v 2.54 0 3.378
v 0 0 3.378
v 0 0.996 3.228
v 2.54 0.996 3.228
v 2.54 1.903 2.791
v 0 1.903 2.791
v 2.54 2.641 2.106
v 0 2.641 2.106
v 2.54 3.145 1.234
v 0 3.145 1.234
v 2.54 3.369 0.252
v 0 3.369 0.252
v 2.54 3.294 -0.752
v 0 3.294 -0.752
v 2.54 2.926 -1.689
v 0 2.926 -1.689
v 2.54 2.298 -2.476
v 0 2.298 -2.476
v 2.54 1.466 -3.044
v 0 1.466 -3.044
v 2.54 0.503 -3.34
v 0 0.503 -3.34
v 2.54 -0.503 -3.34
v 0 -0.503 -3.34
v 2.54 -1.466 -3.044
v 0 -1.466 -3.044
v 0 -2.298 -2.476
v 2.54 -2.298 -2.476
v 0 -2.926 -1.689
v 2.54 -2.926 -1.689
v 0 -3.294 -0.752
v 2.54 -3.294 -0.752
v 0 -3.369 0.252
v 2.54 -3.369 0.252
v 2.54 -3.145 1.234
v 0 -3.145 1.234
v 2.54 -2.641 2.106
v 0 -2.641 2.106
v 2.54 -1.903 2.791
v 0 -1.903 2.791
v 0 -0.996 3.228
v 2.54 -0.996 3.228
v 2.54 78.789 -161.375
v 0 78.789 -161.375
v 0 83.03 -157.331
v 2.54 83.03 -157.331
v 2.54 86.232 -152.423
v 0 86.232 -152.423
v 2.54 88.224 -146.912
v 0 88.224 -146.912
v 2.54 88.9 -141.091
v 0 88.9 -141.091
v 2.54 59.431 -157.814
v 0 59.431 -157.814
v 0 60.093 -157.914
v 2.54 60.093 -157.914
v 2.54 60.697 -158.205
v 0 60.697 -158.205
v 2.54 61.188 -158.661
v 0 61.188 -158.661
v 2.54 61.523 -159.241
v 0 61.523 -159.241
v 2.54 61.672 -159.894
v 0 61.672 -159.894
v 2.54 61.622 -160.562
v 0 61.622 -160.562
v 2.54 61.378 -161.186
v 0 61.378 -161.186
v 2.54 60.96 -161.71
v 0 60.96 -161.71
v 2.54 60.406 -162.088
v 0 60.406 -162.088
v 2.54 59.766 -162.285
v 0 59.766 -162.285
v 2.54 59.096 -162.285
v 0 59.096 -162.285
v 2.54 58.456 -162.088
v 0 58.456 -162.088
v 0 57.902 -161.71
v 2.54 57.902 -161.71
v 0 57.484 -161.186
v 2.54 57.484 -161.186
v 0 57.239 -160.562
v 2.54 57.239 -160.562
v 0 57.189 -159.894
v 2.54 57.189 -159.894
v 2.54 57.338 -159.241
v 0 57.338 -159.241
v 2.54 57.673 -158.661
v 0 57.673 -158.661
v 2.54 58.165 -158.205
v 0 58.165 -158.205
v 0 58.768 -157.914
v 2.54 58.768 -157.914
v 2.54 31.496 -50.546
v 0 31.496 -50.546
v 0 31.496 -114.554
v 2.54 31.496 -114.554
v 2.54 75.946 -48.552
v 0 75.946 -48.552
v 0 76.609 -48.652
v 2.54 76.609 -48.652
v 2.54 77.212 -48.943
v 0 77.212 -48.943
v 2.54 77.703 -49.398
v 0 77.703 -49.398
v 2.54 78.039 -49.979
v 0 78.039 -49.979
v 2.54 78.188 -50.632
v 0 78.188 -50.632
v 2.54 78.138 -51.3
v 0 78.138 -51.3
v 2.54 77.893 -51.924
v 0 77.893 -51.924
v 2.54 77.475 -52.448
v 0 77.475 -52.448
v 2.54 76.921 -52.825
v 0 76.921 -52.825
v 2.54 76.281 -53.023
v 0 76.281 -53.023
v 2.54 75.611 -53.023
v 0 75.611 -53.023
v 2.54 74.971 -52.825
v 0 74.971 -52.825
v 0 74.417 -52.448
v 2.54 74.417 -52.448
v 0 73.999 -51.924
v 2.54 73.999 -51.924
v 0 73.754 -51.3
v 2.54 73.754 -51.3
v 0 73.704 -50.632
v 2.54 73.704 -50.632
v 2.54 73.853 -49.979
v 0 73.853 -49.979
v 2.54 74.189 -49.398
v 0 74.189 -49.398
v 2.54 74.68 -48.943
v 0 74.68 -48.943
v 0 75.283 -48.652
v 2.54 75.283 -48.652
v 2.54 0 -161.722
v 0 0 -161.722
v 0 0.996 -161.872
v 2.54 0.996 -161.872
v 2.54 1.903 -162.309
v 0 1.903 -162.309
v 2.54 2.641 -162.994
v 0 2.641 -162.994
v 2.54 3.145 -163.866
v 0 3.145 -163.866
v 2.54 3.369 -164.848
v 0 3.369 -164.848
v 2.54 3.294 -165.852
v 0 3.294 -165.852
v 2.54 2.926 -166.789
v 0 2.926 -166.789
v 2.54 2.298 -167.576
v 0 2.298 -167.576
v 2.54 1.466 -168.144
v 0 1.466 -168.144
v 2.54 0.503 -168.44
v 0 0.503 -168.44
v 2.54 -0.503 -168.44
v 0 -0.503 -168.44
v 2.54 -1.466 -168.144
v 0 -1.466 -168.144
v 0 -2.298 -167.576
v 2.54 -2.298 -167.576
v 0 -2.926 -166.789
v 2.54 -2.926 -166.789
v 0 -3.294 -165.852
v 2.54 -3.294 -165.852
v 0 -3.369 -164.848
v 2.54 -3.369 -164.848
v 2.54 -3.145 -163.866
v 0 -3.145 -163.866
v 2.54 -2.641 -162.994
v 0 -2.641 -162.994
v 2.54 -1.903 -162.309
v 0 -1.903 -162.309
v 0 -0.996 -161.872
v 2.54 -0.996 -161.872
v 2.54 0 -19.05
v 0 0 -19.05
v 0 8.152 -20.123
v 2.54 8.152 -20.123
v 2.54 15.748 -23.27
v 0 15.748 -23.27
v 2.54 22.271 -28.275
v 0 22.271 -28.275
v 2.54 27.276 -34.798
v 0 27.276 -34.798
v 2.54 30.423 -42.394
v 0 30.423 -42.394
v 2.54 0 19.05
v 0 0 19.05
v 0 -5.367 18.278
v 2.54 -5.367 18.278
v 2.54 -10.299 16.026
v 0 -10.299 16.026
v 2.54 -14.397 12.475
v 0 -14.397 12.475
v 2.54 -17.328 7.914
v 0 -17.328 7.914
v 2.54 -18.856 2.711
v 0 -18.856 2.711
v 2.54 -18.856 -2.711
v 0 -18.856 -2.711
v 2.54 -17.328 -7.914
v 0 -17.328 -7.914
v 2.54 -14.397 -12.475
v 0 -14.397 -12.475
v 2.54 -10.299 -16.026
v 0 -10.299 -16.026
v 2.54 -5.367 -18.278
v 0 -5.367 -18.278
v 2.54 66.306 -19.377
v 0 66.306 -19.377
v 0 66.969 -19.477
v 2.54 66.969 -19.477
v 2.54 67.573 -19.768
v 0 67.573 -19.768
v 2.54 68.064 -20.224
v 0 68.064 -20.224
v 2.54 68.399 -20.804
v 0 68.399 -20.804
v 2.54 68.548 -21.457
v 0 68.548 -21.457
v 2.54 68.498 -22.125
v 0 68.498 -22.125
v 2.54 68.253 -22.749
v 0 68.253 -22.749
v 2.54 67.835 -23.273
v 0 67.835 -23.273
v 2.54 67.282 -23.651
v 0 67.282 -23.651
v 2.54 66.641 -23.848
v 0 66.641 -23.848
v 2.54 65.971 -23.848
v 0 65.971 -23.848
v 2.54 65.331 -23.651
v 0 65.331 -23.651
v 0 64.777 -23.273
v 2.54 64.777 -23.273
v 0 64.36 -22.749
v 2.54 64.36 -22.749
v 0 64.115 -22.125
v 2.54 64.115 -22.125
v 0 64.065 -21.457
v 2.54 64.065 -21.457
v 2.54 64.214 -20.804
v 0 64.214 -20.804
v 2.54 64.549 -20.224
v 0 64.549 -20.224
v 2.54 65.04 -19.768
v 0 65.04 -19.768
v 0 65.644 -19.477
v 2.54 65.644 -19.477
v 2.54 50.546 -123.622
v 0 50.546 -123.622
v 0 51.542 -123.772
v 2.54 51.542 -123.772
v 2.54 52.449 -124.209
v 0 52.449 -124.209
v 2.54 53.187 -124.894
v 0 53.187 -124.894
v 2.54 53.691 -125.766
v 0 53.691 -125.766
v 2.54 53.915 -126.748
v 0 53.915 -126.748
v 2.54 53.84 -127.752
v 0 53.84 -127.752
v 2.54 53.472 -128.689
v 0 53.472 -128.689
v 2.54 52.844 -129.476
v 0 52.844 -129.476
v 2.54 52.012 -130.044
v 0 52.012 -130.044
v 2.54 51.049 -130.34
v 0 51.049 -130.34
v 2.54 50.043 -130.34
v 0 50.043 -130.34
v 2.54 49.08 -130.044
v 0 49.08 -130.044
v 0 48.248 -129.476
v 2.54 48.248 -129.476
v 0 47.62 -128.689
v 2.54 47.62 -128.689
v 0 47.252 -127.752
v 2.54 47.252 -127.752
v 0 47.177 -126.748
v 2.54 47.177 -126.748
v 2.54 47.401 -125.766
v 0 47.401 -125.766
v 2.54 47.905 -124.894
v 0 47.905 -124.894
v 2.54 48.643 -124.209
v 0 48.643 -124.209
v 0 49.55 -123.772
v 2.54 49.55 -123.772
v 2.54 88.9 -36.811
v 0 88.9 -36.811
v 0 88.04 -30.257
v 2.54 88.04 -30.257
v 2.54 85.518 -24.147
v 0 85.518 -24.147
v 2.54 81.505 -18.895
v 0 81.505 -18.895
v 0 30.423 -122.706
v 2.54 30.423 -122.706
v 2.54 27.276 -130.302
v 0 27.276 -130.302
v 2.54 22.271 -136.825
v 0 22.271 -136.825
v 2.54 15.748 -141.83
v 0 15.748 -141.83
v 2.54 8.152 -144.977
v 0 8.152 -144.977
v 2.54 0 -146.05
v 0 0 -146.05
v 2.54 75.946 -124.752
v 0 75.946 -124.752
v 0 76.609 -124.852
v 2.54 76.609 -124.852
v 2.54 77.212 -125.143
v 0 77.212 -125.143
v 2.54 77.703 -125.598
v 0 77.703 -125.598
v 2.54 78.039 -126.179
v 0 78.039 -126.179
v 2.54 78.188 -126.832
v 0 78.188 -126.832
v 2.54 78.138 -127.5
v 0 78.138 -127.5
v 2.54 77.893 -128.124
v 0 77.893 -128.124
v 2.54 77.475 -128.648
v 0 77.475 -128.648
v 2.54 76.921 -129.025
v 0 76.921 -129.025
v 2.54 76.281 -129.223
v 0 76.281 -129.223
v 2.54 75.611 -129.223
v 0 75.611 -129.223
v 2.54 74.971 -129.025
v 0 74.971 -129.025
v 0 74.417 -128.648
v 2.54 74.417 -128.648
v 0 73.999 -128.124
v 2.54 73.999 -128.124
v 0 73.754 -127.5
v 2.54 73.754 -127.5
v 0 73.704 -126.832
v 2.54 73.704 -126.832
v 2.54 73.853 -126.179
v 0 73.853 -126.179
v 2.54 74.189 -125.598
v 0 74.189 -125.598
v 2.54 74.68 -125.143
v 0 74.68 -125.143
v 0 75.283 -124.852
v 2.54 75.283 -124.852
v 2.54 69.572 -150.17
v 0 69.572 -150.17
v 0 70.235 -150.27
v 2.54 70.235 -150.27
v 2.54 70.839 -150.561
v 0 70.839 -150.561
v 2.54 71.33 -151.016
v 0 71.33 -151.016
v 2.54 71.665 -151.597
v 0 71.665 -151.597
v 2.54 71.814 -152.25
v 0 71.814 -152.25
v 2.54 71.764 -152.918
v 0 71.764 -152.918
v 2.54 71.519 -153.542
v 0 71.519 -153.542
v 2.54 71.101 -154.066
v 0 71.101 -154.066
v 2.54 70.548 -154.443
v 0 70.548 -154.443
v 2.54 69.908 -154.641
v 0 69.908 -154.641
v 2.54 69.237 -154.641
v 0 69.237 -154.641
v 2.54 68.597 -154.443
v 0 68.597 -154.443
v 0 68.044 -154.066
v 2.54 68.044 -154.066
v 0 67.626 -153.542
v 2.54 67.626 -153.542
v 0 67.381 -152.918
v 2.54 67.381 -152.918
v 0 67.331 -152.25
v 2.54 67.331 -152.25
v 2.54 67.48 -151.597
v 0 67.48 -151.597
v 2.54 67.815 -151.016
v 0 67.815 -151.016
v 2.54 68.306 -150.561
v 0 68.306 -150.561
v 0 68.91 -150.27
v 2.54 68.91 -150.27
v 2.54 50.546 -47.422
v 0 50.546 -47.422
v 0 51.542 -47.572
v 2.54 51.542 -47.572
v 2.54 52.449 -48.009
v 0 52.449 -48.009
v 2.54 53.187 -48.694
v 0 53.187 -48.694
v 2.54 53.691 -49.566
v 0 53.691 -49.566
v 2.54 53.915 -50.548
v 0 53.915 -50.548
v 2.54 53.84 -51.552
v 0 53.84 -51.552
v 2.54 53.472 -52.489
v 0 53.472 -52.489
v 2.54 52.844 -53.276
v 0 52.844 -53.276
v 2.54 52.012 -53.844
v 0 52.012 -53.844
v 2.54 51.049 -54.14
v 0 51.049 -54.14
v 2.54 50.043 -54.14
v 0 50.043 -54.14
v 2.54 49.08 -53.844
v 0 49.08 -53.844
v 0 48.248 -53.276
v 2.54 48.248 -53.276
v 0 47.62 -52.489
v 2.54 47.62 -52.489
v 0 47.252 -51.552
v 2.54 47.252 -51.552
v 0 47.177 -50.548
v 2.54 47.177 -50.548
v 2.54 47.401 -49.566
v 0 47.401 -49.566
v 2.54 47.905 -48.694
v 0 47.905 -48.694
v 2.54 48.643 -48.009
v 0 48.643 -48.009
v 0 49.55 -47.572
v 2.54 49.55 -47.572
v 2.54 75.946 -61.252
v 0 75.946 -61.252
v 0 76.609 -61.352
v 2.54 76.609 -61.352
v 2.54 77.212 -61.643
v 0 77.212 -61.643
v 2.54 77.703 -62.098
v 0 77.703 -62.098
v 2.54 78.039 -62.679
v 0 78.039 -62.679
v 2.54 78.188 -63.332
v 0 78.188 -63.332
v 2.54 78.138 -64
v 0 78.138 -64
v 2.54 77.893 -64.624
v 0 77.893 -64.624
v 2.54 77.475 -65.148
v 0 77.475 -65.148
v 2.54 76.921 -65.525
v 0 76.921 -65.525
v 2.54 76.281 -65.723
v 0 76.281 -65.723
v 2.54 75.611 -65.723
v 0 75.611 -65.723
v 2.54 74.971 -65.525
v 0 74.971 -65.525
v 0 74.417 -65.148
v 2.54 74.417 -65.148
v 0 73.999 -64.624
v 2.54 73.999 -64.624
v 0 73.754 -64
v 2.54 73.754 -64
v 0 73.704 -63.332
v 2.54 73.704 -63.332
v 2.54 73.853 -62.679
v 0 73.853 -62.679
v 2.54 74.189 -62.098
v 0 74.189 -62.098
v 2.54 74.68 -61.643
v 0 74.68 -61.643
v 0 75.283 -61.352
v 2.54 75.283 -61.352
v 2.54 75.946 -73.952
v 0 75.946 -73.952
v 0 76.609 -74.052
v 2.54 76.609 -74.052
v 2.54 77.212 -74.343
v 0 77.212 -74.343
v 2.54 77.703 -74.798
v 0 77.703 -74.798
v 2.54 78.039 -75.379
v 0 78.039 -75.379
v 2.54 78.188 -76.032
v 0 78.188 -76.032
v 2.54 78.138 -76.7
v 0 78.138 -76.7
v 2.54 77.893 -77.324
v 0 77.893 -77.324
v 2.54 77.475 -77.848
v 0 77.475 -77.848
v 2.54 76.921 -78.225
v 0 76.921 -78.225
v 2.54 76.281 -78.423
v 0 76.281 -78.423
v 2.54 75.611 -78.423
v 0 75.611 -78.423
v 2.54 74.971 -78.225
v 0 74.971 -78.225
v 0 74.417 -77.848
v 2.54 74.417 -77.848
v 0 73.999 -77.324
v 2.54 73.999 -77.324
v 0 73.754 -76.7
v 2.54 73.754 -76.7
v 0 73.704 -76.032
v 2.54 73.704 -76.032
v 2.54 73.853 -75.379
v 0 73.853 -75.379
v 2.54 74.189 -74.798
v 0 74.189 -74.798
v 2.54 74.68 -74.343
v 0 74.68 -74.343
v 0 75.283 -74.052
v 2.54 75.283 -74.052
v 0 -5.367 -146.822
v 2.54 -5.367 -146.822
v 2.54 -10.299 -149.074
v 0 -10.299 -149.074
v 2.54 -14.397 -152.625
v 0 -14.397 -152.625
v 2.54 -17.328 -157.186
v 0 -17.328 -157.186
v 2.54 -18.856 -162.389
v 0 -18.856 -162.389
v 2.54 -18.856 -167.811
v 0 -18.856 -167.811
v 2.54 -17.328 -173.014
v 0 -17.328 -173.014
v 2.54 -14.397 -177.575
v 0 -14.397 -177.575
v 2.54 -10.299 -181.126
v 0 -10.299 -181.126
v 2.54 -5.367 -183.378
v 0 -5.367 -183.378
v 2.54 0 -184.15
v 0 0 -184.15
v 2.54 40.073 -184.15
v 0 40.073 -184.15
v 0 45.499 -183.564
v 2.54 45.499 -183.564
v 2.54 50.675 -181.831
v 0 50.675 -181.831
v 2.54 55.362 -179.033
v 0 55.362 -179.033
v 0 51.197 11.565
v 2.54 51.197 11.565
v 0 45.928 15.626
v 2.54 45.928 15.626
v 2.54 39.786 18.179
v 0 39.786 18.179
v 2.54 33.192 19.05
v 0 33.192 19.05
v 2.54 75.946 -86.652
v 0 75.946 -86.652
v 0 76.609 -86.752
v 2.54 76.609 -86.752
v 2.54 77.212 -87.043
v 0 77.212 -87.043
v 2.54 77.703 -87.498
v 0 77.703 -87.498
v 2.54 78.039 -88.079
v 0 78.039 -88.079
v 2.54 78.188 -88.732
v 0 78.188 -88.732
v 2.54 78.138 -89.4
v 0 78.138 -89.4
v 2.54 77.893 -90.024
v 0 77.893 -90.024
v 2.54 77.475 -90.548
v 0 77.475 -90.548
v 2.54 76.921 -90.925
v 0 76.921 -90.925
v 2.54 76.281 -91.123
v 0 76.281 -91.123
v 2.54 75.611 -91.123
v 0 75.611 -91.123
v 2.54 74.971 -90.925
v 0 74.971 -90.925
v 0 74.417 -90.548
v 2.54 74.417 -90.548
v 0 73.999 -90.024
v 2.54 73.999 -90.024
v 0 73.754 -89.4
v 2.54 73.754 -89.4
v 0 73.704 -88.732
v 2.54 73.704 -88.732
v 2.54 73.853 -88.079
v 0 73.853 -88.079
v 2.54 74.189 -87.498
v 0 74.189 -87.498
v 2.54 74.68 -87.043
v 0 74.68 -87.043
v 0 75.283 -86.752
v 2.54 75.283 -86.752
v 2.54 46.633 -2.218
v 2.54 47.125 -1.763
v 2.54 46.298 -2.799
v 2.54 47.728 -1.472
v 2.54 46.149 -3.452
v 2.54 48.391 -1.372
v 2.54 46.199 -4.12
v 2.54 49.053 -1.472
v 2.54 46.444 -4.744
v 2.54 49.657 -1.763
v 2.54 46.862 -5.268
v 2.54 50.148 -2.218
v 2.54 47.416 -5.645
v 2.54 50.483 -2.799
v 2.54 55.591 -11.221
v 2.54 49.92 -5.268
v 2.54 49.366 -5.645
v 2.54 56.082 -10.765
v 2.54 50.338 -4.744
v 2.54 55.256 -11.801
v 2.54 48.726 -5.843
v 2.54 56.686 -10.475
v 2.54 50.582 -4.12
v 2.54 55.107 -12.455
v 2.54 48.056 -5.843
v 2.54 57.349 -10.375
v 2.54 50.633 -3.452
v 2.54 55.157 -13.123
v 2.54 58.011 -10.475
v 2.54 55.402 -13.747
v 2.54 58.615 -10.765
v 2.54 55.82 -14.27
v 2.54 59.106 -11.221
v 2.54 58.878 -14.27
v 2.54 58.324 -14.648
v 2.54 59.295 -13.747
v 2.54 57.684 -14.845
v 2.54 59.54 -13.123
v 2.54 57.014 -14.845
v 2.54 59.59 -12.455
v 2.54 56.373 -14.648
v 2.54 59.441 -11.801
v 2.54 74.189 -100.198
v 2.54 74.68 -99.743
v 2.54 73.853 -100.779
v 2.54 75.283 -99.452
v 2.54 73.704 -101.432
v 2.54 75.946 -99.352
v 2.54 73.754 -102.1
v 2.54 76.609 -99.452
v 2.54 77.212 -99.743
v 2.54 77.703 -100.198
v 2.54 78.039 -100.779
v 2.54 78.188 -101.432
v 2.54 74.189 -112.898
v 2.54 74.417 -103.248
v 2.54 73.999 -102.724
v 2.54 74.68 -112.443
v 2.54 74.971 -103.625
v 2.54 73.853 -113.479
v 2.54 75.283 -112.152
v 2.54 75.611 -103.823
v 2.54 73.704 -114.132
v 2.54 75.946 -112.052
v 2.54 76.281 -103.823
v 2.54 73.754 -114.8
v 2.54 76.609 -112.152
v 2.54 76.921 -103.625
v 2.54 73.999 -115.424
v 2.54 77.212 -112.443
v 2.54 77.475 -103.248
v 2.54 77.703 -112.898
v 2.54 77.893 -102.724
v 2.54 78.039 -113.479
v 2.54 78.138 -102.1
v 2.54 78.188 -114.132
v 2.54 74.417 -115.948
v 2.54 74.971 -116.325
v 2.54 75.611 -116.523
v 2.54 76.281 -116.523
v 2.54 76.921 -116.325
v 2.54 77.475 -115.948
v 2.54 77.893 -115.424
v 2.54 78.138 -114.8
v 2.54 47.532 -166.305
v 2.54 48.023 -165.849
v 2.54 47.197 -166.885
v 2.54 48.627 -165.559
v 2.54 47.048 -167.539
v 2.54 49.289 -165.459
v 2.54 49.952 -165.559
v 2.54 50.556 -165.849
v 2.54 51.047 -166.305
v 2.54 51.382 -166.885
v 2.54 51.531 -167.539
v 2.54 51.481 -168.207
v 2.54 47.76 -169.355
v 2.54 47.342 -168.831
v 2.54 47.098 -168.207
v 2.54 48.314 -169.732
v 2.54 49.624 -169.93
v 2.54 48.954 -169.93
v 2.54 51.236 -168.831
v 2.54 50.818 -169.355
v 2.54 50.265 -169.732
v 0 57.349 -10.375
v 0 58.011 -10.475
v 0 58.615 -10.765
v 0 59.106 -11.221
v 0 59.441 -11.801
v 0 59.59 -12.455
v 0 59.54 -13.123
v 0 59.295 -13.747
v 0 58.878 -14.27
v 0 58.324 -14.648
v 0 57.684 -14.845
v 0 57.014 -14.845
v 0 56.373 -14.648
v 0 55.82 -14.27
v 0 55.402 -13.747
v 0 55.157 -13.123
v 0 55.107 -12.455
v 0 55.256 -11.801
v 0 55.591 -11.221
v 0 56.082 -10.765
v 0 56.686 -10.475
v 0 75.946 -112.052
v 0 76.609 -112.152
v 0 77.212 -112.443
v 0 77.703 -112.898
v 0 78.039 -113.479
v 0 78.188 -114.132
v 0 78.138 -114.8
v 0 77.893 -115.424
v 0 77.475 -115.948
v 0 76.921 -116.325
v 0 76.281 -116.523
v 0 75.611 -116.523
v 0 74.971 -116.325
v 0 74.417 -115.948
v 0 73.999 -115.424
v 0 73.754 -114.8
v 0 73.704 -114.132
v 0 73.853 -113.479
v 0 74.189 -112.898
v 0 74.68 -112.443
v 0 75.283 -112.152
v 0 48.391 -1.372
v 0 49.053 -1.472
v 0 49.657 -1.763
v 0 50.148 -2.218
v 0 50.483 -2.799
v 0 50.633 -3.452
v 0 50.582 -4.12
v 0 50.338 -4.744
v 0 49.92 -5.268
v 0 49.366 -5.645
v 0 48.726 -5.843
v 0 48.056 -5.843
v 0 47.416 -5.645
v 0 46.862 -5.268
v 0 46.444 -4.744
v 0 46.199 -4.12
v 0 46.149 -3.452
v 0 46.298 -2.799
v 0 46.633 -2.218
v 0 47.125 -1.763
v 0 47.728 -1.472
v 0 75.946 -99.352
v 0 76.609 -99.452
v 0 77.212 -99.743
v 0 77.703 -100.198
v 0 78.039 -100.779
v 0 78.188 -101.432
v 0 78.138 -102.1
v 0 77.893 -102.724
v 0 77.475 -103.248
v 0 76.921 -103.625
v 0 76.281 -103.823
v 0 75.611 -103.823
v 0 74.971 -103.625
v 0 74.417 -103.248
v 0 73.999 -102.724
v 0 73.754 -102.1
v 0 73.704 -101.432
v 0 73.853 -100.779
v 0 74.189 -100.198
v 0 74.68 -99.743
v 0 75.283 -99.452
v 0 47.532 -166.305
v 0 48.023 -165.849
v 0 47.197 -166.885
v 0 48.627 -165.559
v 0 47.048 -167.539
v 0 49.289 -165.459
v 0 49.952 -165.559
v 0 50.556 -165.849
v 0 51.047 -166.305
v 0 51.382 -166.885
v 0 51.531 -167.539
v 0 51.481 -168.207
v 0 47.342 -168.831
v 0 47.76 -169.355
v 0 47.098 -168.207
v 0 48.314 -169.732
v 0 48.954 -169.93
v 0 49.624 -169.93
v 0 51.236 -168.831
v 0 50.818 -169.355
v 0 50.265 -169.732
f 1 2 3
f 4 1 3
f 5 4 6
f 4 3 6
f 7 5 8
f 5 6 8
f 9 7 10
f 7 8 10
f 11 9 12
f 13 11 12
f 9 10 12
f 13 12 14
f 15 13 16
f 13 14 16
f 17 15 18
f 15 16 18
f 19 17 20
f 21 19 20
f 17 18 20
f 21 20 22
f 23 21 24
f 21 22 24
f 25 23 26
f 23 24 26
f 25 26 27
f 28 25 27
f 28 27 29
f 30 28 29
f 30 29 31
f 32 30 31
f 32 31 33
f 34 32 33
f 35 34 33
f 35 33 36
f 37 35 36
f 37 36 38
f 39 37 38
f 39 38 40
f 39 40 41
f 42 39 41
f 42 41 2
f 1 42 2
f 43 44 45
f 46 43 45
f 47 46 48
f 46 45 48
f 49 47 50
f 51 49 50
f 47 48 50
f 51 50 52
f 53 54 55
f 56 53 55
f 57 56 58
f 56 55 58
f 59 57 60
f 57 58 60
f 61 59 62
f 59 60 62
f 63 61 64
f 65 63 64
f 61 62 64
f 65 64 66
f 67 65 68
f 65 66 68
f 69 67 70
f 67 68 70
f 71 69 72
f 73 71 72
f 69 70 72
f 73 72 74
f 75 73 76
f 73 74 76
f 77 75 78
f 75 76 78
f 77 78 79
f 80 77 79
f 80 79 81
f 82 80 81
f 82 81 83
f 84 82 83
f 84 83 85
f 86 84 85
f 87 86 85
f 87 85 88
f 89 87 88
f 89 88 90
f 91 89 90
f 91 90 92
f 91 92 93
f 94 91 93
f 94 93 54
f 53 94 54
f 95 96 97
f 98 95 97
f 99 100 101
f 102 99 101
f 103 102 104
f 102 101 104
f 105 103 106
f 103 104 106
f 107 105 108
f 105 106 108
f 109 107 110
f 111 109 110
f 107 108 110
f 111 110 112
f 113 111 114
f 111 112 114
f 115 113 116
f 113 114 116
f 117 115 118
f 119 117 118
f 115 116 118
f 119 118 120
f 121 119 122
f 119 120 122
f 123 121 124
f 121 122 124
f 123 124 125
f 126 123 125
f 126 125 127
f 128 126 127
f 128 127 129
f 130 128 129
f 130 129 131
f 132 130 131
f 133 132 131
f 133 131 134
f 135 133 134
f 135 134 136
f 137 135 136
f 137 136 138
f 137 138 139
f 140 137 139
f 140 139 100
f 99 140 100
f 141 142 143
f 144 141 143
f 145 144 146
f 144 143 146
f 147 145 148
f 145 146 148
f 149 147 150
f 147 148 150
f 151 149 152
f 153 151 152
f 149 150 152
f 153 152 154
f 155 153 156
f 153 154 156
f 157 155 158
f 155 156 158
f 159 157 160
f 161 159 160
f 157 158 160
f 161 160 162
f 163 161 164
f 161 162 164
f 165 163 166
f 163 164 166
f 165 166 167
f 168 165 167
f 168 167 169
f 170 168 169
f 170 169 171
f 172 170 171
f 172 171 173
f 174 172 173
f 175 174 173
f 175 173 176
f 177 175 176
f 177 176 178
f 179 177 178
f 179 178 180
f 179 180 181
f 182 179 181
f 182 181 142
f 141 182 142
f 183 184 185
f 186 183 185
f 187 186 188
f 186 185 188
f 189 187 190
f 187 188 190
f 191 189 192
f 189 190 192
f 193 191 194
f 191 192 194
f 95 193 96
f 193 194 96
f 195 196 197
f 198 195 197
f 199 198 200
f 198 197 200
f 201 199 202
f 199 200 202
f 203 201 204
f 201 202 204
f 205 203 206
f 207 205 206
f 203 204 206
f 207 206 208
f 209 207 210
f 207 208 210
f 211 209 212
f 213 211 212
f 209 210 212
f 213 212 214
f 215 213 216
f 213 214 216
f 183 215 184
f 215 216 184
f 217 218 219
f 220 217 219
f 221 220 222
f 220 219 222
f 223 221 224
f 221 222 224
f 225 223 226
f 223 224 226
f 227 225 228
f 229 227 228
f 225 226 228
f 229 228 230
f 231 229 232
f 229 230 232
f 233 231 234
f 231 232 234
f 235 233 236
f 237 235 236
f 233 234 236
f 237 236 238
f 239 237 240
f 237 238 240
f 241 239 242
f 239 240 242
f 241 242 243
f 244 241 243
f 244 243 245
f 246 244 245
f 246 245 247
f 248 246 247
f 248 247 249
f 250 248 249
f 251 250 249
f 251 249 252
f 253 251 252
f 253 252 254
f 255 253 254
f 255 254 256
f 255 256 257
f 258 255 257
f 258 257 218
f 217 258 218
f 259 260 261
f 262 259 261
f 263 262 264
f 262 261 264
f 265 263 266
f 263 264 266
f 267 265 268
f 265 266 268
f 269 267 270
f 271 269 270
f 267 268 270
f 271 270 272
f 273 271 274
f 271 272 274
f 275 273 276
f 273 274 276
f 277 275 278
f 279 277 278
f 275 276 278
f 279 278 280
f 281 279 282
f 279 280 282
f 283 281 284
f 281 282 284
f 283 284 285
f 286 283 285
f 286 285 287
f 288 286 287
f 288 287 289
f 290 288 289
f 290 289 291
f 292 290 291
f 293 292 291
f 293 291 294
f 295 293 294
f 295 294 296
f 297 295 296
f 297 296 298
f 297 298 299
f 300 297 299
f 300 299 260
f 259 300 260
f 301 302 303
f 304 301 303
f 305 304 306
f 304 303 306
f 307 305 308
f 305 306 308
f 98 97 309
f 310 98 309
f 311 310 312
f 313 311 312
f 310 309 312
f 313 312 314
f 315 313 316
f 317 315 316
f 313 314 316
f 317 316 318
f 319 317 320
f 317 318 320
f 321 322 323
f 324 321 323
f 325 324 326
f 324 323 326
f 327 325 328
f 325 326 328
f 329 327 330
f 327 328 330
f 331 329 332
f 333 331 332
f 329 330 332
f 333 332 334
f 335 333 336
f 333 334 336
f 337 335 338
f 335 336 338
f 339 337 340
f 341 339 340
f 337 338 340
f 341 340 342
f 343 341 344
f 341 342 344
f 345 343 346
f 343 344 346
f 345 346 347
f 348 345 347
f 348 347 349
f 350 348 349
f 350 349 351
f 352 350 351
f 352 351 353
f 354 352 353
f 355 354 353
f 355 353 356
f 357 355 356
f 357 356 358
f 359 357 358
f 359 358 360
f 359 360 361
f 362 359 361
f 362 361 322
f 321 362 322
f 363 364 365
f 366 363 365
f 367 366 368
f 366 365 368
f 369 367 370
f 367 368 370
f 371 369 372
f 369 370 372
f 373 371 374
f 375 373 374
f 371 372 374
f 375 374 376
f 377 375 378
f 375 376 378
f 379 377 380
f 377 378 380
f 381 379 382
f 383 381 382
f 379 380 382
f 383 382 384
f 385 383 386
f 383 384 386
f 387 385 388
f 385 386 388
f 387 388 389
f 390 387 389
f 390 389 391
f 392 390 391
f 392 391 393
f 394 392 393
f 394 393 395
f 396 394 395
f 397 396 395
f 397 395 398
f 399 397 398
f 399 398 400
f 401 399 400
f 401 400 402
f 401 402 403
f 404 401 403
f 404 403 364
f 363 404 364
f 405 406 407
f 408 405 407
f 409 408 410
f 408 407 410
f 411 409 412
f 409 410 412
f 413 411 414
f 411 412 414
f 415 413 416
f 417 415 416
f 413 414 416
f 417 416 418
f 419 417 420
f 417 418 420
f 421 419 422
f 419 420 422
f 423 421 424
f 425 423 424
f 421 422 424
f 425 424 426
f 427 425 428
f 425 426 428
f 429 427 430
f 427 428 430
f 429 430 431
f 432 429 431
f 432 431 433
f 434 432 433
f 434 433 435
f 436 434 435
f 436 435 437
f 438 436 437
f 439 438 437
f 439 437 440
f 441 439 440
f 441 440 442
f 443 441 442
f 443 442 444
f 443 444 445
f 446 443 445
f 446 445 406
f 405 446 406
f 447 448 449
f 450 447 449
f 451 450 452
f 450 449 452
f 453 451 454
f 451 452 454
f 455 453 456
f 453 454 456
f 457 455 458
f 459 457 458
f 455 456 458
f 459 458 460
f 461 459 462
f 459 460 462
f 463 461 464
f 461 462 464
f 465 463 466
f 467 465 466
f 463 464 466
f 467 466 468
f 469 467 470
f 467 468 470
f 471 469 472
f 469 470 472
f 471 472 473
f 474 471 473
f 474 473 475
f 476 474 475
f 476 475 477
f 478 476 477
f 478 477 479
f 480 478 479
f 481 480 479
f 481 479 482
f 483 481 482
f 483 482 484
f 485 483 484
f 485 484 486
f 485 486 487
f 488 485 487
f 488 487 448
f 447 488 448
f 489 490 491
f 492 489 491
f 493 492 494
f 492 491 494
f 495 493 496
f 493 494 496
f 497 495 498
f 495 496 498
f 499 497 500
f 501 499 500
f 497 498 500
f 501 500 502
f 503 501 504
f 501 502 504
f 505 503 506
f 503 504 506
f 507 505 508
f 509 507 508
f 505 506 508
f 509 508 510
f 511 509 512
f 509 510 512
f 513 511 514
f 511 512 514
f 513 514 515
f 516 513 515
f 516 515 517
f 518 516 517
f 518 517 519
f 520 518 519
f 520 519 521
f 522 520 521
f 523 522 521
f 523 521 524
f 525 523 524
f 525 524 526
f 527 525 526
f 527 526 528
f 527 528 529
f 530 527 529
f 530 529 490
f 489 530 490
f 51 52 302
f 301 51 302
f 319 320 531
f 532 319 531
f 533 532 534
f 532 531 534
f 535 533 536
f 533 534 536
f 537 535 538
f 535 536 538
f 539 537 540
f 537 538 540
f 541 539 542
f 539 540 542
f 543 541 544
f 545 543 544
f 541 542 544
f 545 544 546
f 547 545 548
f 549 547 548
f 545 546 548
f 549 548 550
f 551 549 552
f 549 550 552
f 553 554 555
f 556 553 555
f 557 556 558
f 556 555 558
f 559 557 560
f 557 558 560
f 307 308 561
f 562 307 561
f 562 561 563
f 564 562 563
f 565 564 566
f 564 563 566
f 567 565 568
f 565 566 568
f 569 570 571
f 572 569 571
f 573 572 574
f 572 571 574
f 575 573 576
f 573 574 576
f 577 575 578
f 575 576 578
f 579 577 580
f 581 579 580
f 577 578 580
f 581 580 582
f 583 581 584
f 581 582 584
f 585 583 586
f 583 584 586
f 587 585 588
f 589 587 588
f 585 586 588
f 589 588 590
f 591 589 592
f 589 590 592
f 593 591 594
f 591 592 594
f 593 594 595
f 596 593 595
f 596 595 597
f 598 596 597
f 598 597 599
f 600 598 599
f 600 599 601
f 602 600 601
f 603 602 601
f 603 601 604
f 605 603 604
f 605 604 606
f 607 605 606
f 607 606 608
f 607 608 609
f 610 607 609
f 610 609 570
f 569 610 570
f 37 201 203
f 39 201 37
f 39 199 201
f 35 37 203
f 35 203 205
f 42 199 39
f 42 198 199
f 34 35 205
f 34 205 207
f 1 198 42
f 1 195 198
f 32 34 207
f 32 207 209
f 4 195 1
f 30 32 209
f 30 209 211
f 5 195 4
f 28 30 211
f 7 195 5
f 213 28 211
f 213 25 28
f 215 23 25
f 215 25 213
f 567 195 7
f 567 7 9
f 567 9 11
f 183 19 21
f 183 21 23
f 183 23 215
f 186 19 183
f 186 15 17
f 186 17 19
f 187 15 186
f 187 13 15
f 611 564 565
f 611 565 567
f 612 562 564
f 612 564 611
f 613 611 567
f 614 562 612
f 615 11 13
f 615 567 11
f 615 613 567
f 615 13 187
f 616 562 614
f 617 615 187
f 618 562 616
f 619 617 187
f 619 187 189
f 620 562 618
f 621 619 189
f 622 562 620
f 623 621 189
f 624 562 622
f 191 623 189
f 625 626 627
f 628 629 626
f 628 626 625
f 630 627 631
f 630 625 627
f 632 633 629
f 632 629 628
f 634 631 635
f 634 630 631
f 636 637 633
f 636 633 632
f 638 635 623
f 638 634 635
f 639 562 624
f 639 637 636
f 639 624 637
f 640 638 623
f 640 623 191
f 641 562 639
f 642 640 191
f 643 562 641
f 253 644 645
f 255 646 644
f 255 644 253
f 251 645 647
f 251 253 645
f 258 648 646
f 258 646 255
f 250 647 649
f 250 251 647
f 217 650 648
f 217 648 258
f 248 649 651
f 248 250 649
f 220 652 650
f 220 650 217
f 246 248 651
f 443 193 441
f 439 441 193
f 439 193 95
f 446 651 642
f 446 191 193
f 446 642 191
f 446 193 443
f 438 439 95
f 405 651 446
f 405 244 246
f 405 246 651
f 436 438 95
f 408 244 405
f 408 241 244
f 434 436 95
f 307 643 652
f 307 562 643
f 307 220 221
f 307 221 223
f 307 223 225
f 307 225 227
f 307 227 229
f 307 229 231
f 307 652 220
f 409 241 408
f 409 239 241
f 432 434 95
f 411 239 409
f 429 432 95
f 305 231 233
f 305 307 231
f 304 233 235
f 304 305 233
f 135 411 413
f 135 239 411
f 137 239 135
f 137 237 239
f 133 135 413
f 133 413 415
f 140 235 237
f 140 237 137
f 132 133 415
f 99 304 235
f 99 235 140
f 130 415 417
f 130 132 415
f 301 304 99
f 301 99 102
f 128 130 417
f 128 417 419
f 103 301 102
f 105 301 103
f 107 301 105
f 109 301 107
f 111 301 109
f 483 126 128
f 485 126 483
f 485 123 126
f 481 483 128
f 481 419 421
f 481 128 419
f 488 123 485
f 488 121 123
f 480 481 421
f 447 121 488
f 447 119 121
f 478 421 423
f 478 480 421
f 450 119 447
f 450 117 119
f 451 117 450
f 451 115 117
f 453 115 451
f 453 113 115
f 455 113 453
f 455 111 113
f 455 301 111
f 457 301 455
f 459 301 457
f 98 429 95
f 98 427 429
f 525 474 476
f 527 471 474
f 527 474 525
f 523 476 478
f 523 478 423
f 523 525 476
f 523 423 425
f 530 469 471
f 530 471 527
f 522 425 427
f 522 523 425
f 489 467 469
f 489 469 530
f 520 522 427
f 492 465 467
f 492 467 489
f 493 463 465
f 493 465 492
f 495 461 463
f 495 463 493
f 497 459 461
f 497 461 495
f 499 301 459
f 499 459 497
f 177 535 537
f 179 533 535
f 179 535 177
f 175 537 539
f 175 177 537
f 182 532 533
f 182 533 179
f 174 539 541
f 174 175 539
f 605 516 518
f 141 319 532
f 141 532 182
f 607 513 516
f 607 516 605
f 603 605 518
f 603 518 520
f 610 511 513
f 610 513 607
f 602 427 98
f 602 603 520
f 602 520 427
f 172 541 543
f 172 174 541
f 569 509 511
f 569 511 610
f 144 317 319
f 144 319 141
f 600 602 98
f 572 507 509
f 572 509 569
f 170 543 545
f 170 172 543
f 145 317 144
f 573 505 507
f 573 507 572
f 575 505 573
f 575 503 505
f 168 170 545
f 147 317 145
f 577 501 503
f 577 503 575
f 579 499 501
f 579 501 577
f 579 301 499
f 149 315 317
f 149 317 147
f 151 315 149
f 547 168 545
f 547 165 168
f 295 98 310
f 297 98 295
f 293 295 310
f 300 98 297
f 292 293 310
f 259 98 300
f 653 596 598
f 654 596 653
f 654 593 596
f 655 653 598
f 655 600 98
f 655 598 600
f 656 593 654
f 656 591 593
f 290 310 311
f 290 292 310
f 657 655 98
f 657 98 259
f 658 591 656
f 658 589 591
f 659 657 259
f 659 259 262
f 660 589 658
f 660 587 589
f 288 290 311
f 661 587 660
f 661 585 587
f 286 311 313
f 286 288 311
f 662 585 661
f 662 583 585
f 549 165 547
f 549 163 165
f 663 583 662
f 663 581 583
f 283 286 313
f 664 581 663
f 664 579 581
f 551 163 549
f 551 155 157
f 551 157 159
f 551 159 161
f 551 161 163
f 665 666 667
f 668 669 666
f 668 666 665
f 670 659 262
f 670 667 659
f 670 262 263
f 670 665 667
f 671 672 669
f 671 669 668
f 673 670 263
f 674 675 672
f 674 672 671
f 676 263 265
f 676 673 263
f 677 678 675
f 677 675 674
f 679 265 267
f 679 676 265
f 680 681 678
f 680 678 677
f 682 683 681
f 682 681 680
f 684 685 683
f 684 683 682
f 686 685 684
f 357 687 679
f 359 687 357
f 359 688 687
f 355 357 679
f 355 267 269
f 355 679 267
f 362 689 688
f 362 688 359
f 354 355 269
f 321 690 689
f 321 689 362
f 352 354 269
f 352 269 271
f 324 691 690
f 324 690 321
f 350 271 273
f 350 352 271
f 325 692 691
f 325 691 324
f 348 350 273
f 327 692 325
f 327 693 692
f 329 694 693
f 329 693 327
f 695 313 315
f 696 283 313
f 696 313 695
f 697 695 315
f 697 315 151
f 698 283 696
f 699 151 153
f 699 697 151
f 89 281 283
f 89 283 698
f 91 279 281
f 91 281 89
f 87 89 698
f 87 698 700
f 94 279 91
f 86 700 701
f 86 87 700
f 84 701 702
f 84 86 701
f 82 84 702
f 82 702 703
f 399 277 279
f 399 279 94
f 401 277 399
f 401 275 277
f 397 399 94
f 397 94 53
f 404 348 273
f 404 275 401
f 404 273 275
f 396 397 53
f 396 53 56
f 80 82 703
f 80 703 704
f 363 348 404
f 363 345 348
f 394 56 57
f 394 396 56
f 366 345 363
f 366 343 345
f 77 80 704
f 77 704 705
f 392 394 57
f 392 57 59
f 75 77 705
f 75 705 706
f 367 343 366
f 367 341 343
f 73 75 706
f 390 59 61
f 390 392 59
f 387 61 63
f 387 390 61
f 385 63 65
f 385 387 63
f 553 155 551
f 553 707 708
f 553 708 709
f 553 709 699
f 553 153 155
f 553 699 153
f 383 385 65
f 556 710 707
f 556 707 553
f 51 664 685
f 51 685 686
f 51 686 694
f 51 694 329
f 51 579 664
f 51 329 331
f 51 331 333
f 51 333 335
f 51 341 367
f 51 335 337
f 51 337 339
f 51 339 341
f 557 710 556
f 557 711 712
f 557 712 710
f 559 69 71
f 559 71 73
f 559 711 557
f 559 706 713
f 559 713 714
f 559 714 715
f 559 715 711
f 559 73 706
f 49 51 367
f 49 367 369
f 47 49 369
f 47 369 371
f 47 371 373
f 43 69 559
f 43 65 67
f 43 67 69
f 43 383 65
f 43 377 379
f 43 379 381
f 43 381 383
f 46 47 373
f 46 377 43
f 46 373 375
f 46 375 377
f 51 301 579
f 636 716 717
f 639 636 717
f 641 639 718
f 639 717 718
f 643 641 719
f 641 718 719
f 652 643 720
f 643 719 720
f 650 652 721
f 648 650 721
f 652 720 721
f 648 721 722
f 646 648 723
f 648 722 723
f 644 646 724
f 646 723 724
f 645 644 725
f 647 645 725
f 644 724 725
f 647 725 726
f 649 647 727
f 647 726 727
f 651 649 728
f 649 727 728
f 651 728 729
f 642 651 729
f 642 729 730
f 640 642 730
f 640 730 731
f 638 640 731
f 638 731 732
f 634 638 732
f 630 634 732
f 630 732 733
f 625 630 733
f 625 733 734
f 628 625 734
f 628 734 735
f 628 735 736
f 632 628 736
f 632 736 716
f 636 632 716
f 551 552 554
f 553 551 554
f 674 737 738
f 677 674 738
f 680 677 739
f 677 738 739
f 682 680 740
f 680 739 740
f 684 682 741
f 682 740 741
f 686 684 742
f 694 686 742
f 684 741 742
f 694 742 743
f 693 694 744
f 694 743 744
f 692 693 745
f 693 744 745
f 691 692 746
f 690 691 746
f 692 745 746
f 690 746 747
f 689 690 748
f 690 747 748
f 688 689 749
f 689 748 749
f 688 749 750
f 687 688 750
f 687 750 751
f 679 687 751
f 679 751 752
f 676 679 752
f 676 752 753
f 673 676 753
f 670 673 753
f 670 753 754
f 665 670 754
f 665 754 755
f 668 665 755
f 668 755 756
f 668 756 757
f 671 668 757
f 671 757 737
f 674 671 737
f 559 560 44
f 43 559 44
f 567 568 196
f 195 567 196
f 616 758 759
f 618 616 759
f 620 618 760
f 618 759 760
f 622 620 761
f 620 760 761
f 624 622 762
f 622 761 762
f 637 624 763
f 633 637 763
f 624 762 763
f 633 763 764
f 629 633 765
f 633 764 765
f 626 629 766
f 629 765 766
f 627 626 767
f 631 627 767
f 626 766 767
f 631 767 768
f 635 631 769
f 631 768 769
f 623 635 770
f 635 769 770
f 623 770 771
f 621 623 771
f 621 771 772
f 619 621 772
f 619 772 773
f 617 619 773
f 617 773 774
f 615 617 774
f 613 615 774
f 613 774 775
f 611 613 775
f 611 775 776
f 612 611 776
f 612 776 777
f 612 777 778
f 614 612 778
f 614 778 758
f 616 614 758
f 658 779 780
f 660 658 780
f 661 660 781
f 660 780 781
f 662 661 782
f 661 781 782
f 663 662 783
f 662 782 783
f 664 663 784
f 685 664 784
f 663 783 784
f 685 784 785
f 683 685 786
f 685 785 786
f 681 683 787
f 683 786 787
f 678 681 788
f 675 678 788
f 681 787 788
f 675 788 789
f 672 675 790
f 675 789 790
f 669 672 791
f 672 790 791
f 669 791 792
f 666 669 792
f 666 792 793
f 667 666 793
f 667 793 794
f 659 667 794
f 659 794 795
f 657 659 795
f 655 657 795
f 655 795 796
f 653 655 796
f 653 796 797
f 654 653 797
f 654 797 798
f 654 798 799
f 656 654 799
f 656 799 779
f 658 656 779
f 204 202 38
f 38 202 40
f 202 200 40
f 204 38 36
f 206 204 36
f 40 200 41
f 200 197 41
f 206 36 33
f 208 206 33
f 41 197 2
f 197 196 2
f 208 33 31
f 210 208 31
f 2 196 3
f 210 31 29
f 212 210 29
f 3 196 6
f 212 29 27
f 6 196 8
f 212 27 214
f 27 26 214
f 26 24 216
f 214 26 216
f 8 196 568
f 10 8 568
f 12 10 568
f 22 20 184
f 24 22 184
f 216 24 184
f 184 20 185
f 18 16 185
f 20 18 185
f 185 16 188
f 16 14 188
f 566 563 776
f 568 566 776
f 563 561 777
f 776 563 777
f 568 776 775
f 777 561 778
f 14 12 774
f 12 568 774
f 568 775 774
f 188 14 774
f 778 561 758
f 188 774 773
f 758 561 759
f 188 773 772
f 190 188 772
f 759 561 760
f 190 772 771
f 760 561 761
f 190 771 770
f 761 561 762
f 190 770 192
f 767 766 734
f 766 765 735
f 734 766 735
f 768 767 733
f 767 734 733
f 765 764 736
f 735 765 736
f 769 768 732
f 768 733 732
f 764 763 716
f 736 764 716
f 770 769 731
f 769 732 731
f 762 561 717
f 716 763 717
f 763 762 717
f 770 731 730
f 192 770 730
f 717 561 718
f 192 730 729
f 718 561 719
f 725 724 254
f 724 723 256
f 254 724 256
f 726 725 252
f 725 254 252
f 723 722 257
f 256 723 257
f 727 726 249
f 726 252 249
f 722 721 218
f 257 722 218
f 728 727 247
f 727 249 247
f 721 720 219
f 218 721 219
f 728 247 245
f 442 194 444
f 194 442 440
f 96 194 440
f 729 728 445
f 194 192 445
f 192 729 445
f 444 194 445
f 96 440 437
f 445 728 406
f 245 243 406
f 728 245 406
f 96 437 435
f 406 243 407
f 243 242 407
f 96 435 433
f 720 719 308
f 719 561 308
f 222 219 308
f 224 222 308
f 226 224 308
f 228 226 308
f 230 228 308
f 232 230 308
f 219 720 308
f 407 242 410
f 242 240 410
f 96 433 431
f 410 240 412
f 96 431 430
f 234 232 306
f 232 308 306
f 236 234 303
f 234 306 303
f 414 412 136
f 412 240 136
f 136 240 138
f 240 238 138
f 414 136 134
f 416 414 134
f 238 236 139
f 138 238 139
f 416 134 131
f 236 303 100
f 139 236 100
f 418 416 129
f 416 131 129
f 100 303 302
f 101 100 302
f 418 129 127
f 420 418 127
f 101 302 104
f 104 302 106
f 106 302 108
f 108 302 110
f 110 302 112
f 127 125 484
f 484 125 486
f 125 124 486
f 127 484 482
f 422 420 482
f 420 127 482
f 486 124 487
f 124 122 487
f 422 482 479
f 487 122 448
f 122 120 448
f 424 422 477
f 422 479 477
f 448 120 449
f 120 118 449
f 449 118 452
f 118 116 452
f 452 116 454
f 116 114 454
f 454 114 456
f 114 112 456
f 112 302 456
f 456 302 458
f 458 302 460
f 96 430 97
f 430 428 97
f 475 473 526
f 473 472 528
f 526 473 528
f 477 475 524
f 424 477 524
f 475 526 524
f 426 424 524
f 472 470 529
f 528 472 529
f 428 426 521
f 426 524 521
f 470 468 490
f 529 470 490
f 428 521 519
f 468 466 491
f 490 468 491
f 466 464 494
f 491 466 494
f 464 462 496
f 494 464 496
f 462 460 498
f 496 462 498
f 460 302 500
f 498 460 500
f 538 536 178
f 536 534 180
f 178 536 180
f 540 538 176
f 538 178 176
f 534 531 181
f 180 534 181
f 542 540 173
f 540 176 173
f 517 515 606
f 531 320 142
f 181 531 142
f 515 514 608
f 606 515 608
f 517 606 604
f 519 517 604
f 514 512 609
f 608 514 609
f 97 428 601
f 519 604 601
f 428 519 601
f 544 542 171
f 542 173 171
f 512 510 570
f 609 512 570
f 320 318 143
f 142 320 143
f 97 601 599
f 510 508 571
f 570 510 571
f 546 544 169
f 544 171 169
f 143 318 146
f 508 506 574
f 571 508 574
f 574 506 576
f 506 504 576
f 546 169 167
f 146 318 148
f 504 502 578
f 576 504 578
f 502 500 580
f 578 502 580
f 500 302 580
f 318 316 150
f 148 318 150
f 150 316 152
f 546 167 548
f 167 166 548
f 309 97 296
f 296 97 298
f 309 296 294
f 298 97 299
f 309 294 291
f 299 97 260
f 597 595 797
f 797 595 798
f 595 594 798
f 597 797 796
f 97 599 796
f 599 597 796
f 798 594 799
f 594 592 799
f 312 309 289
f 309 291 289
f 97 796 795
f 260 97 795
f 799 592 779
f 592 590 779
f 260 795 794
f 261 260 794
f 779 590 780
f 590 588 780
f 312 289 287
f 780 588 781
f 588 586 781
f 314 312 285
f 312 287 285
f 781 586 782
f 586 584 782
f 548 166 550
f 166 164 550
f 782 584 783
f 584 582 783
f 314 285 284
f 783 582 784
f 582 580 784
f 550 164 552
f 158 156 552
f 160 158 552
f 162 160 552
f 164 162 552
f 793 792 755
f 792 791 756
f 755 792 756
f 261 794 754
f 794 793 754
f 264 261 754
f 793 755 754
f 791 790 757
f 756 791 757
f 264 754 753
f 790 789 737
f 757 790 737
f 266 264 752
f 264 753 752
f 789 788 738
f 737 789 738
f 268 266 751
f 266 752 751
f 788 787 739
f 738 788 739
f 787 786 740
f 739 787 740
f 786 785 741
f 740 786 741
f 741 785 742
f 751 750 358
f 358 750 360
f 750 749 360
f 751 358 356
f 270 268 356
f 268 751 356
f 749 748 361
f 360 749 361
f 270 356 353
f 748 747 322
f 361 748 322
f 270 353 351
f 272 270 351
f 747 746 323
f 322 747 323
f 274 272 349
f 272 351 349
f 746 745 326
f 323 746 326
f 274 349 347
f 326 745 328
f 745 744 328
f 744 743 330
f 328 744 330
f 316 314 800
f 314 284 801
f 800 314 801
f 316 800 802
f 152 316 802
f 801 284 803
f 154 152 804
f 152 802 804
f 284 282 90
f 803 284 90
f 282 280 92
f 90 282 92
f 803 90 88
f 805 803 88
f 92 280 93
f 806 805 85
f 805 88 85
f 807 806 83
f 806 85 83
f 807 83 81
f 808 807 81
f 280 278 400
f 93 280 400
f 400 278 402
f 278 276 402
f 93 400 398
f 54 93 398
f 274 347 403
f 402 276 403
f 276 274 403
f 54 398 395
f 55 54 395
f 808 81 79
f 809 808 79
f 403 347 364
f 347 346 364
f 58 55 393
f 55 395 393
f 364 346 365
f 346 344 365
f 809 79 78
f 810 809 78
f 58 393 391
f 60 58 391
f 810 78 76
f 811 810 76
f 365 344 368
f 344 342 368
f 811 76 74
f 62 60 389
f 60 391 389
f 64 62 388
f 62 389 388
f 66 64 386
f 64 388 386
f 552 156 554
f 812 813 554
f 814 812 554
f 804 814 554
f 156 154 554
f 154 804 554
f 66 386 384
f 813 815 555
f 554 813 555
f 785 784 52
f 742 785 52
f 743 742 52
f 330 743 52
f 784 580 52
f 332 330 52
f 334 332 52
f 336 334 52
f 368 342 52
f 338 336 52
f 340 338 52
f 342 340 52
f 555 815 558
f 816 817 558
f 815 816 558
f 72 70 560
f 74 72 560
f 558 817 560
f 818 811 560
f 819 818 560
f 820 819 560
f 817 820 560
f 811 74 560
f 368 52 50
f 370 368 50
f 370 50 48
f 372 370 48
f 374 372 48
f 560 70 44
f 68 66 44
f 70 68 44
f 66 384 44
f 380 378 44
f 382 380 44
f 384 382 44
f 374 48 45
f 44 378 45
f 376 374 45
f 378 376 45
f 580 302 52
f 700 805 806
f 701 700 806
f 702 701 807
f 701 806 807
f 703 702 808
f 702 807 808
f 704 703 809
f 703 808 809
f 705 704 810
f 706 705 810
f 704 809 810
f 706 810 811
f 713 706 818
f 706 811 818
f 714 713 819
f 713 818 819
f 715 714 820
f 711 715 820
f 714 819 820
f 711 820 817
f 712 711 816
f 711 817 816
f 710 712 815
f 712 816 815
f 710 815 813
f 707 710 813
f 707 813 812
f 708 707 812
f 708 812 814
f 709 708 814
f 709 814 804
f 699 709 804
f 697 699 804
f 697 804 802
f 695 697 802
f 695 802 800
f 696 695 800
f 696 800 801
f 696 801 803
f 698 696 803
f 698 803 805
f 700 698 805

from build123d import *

# Parameters (mm, degrees)
BOSS_EXTRUDE1_DEPTH     = 2.54
F_1_4_CLEARANCE_HOLE1_D = 6.7564
F_8_CLEARANCE_HOLE2_D   = 4.4958


with BuildPart() as part:
    # Sketch1 → Boss-Extrude1 (new body)
    with BuildSketch(Plane(origin=(0, 0, 0), x_dir=(0, 0, -1), z_dir=(1, 0, 0))):
        with BuildLine():
            Line((50.546, 31.496), (114.554, 31.496))
            ThreePointArc((114.554, 31.496), (136.82503518, 22.27103518), (146.05, 0))
            ThreePointArc((146.05, 0), (165.1, -19.05), (184.15, 0))
            Line((184.15, 0), (184.15, 40.072825067))
            ThreePointArc((184.15, 40.072825067), (182.836868766, 48.134013135), (179.03324779, 55.36170531))
            Line((179.03324779, 55.36170531), (161.374573217, 78.788880244))
            ThreePointArc((161.374573217, 78.788880244), (152.423192921, 86.232108989), (141.091325427, 88.9))
            Line((141.091325427, 88.9), (36.810551917, 88.9))
            ThreePointArc((36.810551917, 88.9), (27.119806989, 86.978702323), (18.895109756, 81.505469508))
            Line((18.895109756, 81.505469508), (-11.56544216, 51.197220351))
            ThreePointArc((-11.56544216, 51.197220351), (-17.104341079, 42.941309016), (-19.05, 33.191750843))
            Line((-19.05, 33.191750843), (-19.05, 0))
            ThreePointArc((-19.05, 0), (0, -19.05), (19.05, 0))
            ThreePointArc((19.05, 0), (28.27496482, 22.27103518), (50.546, 31.496))
        make_face()
    extrude(amount=BOSS_EXTRUDE1_DEPTH)

    # 1/4 Clearance Hole1 (through all)
    with Locations(Plane(origin=(2.54, 0, 0), x_dir=(0, 0, -1), z_dir=(1, 0, 0))):
        with Locations((50.8, 50.546), (127, 50.546), (165.1, 0), (0, 0)):
            Hole(F_1_4_CLEARANCE_HOLE1_D / 2)

    # #8 Clearance Hole2 (through all)
    with Locations(Plane(origin=(2.54, 0, 0), x_dir=(0, 0, -1), z_dir=(1, 0, 0))):
        with Locations((76.2, 75.946), (88.9, 75.946), (101.6, 75.946), (21.625289632, 66.306331256), (12.622554878, 57.348610175), (3.619820124, 48.390889095), (152.417846487, 69.57247655), (160.062286608, 59.430852655), (167.70672673, 49.28922876), (63.5, 75.946), (50.8, 75.946), (114.3, 75.946), (127, 75.946)):
            Hole(F_8_CLEARANCE_HOLE2_D / 2)


solid = part.part
